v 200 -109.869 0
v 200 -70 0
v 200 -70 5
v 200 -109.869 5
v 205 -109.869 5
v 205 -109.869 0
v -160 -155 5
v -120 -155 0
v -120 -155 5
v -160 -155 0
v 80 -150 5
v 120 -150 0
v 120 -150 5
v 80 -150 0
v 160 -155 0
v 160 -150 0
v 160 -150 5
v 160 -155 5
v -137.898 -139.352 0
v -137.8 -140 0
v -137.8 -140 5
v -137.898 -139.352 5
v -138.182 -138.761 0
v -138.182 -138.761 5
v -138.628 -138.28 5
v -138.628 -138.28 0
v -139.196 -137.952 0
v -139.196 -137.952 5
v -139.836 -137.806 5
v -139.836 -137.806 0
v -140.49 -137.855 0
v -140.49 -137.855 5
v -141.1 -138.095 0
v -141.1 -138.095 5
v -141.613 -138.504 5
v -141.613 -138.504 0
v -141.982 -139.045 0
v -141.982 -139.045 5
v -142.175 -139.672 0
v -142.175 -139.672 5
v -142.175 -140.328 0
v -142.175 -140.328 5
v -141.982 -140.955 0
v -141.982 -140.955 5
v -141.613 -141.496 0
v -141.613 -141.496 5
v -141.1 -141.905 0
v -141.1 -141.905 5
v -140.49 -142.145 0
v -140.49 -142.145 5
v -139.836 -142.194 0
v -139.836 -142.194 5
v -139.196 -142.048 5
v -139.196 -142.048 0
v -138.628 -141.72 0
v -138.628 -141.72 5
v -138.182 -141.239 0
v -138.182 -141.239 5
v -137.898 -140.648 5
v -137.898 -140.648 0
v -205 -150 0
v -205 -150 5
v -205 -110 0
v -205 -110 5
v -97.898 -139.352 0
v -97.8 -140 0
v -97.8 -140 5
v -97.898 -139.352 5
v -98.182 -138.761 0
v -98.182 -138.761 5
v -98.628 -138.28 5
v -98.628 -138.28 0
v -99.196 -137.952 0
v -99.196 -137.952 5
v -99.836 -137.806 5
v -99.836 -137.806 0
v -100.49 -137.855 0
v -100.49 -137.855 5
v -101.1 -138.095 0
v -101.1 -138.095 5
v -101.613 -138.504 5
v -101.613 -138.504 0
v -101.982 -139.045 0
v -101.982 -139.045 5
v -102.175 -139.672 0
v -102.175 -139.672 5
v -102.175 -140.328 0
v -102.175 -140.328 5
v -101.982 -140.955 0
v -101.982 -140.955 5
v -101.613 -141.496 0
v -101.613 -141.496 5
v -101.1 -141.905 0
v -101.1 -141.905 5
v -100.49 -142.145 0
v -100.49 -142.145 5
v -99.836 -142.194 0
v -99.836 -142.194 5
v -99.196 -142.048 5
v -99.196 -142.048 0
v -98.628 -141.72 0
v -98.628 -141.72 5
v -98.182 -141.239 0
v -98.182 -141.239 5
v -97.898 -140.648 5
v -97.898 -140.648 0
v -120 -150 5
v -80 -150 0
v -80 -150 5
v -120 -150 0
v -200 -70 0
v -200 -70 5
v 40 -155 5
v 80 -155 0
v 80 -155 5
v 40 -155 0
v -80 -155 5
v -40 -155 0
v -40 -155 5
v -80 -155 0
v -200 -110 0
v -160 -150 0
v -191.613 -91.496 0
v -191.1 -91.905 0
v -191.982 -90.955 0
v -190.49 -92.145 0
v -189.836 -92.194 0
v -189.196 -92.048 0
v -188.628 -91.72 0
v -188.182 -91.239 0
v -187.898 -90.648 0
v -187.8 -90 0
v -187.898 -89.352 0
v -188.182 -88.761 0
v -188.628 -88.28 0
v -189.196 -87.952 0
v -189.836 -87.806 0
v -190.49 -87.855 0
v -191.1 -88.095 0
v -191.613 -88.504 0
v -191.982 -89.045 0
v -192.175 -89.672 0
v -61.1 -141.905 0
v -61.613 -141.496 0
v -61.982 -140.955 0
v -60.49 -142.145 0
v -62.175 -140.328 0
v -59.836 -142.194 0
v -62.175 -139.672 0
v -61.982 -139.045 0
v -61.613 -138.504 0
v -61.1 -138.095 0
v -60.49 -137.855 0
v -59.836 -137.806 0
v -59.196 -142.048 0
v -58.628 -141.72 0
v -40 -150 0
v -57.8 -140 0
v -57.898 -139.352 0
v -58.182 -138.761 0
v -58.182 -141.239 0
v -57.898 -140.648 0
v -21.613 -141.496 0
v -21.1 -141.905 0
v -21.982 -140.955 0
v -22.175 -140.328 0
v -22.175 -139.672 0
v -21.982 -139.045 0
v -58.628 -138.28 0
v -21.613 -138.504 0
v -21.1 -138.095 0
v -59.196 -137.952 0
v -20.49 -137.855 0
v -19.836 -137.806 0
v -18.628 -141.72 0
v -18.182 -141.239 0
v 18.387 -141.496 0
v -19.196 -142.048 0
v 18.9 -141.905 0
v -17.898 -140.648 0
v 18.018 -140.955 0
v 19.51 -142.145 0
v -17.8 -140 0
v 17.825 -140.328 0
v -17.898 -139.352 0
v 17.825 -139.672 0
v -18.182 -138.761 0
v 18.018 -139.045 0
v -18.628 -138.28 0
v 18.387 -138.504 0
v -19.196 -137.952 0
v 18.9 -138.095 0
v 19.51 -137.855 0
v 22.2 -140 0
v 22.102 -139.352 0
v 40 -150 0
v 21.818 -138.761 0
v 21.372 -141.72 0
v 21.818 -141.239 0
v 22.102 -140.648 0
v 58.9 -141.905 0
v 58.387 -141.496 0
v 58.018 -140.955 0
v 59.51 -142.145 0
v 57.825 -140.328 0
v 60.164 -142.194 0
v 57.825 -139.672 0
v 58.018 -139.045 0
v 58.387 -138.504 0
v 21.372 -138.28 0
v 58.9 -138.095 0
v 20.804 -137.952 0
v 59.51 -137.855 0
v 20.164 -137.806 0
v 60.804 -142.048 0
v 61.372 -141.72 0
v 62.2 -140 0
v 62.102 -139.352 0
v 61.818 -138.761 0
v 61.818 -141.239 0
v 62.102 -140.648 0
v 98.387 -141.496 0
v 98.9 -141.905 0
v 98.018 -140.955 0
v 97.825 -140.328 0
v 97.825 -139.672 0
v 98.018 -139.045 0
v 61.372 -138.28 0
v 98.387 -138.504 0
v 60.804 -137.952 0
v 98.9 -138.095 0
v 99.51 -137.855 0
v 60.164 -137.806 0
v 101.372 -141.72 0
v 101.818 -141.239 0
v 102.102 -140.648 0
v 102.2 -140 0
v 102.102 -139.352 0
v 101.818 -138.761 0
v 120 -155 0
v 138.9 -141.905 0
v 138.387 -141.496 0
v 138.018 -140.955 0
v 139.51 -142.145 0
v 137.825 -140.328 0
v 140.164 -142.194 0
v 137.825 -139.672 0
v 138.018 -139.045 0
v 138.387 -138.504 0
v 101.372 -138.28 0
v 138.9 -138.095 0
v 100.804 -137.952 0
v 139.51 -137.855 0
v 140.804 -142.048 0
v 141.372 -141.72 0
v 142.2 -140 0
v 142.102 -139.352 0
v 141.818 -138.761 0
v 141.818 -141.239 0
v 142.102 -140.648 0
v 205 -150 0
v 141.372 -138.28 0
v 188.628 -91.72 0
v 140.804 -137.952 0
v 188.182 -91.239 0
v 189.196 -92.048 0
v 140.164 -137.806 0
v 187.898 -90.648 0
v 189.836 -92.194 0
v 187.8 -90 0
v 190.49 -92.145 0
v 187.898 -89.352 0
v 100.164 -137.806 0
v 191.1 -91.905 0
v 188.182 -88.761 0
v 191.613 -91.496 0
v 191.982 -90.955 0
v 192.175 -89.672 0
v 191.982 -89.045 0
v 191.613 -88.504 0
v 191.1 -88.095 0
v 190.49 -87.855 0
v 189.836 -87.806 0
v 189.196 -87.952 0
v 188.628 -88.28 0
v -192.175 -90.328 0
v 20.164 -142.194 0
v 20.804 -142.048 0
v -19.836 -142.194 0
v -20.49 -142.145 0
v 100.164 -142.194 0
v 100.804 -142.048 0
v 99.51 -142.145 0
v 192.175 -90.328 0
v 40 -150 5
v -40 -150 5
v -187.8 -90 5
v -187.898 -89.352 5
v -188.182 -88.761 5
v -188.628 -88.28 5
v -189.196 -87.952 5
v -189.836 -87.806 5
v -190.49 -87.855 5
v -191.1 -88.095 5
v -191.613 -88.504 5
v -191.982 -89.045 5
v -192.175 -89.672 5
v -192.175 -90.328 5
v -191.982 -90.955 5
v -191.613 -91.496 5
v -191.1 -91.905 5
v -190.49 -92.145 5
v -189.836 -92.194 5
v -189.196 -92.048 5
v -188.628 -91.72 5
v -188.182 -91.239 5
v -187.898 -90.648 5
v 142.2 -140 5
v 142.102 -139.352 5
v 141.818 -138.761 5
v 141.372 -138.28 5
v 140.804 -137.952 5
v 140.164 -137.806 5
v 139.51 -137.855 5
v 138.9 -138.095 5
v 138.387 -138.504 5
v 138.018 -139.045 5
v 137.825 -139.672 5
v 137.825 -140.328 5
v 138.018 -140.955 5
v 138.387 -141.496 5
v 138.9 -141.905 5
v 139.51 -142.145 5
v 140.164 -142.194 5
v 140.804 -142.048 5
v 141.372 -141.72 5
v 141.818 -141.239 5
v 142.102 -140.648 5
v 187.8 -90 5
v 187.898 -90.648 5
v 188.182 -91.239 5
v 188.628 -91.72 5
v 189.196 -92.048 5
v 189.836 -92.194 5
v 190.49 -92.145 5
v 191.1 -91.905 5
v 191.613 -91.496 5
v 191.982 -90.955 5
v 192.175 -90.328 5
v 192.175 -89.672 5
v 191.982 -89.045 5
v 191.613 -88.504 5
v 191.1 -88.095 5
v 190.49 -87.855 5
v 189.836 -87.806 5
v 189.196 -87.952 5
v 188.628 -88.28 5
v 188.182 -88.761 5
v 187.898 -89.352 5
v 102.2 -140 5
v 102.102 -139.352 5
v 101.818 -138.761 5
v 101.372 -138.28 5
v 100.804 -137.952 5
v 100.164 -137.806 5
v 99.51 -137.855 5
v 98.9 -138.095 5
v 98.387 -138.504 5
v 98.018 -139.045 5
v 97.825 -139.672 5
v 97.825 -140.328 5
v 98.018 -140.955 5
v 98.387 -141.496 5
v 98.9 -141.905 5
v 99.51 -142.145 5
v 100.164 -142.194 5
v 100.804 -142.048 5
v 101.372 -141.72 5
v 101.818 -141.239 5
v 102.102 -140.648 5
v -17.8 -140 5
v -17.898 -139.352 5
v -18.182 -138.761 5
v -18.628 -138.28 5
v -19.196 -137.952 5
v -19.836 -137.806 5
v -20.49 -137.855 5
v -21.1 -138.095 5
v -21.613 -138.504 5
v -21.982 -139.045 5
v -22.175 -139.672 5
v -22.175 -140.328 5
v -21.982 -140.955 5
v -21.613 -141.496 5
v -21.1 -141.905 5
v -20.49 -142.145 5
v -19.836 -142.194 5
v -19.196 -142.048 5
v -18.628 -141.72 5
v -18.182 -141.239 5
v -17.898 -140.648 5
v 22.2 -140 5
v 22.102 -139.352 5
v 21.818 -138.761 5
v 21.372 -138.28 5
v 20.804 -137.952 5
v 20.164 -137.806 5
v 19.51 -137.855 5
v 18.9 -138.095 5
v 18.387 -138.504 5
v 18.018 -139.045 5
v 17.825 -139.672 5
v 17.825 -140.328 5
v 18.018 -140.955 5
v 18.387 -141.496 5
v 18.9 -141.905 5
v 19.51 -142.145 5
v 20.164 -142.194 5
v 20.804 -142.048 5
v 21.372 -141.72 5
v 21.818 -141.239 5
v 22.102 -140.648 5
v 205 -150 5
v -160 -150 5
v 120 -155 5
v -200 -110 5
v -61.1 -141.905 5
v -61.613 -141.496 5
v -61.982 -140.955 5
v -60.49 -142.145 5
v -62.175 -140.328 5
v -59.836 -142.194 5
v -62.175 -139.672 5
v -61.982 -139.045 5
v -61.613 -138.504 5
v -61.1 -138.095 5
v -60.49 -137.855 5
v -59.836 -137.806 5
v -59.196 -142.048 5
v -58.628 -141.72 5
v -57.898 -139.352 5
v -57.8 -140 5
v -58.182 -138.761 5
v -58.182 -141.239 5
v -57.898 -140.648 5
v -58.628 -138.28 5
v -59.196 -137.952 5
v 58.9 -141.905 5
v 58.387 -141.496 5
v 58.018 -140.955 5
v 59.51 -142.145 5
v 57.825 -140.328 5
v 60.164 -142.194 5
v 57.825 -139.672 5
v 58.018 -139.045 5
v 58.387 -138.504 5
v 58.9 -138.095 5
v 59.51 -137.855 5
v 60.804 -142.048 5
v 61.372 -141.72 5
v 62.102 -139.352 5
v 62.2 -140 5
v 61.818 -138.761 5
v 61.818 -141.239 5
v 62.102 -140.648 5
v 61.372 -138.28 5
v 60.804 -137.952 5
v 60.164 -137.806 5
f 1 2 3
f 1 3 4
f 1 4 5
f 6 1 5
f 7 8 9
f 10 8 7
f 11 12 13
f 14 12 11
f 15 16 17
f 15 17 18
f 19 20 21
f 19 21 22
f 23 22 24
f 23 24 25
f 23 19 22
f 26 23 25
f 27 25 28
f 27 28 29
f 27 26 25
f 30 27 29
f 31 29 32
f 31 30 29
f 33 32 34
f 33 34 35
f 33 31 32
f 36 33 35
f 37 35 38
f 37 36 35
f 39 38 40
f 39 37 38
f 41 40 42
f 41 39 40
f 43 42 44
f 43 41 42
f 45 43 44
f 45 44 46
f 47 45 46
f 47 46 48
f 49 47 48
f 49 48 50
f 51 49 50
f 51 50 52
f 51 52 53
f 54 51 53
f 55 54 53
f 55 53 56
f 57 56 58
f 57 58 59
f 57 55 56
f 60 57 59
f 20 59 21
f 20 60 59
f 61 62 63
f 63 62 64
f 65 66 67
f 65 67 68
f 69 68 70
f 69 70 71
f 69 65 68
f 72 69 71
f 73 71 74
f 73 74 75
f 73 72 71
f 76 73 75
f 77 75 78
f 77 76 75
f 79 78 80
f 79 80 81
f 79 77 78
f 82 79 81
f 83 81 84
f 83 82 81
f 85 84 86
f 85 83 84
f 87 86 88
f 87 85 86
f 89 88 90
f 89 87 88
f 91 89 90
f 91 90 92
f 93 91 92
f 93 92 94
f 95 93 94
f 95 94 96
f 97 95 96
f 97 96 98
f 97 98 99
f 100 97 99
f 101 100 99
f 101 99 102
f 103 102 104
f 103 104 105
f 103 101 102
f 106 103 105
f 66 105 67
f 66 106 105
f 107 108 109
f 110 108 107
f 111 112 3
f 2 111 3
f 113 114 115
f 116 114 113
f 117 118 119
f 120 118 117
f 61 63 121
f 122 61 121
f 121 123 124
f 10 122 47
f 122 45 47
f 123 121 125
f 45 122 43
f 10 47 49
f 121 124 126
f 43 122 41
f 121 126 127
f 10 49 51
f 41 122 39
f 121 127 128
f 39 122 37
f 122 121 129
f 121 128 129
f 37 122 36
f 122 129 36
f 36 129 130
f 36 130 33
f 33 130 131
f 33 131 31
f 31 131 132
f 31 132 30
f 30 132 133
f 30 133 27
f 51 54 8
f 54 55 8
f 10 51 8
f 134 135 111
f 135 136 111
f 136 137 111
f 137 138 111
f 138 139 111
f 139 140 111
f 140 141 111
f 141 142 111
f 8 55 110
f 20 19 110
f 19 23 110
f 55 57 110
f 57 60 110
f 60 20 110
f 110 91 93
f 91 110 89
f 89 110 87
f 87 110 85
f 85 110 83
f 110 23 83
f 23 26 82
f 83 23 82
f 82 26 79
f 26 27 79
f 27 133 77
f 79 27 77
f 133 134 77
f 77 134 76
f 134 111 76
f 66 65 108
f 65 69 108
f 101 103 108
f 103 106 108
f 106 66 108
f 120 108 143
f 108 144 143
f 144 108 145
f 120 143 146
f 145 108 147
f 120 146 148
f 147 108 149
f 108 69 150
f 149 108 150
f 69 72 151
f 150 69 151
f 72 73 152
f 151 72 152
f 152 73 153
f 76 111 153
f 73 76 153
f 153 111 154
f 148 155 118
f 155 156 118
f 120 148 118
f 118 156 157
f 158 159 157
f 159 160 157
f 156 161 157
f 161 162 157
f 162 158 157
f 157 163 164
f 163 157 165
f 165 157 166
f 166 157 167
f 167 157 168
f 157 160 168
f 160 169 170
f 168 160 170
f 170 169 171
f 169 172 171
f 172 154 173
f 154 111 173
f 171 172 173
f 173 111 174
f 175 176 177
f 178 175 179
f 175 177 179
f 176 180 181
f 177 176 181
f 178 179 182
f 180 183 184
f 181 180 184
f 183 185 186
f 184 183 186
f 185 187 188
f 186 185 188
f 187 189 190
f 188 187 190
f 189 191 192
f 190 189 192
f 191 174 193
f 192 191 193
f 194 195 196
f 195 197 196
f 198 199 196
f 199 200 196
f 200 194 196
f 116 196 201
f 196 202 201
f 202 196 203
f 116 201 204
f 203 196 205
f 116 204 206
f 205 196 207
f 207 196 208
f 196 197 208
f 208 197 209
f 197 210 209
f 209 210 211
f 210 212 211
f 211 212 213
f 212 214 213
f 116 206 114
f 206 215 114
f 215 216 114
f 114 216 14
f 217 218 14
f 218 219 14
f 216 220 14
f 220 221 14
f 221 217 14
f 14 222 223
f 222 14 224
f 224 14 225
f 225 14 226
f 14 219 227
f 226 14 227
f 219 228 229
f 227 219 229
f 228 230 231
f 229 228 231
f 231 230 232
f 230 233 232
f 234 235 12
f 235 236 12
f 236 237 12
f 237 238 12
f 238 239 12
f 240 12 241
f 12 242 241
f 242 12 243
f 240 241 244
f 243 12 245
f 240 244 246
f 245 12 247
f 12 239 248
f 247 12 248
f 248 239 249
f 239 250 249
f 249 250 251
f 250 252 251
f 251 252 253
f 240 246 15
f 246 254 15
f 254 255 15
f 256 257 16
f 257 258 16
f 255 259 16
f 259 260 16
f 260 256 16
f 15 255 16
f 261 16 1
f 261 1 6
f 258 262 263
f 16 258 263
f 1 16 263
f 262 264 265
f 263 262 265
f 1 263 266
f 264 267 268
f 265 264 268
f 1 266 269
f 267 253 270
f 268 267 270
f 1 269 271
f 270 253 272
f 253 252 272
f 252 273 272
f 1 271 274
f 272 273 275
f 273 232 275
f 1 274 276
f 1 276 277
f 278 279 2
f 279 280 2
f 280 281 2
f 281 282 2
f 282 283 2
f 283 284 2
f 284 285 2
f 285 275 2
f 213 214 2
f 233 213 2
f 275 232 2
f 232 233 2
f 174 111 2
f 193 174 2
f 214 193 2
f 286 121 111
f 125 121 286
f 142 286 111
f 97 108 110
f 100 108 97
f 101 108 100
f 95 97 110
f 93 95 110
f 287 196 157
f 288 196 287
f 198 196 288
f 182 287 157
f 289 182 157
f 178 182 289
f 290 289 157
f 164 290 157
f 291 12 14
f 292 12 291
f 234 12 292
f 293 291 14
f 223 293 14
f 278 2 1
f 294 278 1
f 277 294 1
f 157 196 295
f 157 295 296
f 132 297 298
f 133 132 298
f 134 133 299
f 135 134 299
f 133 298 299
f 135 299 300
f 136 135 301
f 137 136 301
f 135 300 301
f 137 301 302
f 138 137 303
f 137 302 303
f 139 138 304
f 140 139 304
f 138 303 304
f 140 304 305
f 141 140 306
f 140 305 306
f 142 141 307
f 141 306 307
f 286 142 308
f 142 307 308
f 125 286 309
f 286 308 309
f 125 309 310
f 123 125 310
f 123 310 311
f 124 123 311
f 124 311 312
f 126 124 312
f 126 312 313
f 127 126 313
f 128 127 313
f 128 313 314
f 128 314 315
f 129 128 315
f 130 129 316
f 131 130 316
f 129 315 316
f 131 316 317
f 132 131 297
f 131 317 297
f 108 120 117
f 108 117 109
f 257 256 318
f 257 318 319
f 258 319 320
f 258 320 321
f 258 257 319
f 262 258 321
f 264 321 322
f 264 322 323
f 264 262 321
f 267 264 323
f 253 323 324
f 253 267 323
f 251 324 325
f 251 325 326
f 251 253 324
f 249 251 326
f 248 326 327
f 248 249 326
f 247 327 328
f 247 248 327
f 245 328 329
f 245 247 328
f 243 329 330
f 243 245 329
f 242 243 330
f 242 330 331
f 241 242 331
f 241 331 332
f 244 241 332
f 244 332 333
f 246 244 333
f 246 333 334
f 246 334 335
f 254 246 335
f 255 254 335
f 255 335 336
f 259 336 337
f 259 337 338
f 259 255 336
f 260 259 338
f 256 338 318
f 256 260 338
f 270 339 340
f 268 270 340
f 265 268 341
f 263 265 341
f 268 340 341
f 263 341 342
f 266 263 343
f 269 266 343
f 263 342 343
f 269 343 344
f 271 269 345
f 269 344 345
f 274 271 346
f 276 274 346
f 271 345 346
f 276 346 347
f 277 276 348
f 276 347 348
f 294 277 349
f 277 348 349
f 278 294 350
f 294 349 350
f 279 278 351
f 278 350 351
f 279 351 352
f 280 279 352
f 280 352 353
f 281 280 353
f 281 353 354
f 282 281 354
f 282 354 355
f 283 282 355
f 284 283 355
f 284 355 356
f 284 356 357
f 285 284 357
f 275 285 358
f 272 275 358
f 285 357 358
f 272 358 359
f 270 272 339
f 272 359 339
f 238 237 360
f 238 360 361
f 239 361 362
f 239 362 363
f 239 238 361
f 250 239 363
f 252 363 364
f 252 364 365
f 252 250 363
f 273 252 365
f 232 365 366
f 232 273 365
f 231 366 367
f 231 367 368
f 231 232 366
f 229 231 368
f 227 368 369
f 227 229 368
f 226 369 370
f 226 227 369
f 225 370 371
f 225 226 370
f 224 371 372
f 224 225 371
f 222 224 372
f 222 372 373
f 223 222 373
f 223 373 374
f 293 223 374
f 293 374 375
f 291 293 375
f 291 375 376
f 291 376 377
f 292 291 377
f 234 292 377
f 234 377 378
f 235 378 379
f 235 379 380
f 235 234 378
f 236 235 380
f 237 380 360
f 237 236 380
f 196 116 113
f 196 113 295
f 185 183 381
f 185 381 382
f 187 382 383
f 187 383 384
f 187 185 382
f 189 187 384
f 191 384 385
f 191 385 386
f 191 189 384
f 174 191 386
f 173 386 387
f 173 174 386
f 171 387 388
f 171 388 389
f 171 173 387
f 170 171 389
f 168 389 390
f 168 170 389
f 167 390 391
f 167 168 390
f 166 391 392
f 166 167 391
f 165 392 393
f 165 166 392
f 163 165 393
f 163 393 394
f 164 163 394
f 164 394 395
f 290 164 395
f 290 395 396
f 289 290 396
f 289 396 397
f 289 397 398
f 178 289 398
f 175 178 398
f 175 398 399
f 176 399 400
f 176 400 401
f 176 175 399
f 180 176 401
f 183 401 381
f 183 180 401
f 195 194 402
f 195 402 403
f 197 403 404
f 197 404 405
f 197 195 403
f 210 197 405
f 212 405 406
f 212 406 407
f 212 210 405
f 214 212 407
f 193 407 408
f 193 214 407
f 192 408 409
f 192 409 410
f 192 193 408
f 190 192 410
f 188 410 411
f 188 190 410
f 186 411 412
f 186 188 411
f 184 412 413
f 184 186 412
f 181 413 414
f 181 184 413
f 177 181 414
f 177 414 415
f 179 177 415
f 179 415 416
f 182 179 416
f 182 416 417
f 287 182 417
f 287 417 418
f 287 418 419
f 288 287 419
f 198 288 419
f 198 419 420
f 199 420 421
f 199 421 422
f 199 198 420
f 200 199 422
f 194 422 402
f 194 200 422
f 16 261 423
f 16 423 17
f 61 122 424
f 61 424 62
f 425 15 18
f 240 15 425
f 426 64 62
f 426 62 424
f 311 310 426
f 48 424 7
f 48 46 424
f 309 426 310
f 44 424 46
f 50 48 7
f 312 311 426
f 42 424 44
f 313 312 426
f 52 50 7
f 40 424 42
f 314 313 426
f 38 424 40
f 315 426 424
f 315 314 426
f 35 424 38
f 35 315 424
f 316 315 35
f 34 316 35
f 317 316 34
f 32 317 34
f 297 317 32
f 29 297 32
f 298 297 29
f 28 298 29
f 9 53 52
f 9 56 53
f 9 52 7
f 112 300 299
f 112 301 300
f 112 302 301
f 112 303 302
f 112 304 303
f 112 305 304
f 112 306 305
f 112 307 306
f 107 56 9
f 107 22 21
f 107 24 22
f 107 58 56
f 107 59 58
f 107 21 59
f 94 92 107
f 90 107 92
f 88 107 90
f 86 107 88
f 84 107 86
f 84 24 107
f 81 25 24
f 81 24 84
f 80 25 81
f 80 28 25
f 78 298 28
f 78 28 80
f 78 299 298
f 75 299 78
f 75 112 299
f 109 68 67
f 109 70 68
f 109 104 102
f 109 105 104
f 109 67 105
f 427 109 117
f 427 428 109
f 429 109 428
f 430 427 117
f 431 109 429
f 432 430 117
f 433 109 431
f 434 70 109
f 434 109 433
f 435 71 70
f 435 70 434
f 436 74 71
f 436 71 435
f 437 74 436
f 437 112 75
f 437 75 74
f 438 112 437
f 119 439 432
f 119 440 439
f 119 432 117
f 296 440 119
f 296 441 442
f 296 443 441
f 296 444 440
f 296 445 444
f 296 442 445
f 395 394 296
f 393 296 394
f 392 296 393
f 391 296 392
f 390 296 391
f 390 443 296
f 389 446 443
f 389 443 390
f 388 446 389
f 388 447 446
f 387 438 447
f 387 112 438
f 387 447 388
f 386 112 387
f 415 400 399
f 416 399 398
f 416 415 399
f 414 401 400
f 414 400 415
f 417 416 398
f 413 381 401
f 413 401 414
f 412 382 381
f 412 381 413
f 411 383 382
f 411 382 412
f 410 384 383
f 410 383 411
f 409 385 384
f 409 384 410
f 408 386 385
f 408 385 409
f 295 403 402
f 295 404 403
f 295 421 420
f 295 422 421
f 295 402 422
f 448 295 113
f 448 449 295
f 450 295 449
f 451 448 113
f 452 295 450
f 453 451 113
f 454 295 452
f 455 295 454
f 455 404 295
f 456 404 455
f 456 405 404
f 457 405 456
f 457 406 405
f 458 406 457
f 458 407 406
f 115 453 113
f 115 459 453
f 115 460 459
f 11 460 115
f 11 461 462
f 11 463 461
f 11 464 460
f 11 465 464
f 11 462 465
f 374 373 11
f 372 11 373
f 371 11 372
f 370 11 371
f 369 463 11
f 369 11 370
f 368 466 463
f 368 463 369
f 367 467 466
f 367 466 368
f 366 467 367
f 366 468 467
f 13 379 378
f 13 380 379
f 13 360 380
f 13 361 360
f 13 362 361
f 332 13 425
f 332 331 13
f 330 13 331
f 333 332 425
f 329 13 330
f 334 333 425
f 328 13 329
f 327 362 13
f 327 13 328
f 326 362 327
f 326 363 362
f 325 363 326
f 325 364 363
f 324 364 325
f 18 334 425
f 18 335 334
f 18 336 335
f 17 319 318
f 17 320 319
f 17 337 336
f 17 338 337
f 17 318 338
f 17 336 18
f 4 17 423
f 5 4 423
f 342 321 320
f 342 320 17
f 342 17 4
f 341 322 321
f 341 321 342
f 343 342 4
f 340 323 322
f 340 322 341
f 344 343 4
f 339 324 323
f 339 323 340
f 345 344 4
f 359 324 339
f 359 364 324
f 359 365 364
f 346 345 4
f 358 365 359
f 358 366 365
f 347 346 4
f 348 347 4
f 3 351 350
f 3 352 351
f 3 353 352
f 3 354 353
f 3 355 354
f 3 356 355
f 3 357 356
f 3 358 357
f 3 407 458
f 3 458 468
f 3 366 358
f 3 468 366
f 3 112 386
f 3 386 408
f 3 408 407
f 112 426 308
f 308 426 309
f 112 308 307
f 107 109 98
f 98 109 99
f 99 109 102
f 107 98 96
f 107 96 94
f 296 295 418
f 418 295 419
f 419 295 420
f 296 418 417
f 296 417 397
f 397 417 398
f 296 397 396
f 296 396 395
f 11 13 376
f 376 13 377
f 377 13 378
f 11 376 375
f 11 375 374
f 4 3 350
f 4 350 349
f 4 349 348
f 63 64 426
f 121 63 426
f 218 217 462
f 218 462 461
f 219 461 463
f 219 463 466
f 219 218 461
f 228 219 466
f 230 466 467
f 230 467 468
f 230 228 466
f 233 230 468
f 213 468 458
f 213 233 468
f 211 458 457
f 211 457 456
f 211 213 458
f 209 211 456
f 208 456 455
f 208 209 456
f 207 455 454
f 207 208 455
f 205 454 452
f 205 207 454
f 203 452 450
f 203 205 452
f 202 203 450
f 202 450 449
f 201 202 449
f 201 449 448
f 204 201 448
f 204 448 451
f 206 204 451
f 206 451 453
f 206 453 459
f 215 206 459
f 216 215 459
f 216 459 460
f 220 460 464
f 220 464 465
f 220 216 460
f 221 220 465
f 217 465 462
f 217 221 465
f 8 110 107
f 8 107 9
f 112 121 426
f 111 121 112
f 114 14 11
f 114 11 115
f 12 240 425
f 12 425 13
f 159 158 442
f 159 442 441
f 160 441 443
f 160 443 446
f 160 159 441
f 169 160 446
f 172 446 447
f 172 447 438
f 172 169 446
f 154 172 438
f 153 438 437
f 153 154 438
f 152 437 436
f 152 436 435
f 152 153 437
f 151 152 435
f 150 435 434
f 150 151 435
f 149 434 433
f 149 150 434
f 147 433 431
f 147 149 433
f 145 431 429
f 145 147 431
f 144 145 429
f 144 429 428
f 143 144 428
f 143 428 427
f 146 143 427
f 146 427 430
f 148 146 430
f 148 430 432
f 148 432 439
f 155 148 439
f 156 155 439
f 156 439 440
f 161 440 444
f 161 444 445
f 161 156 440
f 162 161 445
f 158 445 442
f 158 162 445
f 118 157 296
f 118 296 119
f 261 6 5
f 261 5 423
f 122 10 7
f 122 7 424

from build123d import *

# Parameters (mm, degrees)
SKETCH_1_R          = 2.2
EXTRUDE_1_DEPTH     = 5
SKETCH_2_W          = 5
SKETCH_2_H          = 220.282443136
SKETCH_2_H_2        = 219.868690955
CUT_EXTRUDE_1_DEPTH = 10
SKETCH_3_W          = 5
SKETCH_3_H          = 40
EXTRUDE_3_DEPTH     = 5
SKETCH_4_W          = 390.4211829
SKETCH_4_H          = 264.690207343
EXTRUDE_4_DEPTH     = 5
SKETCH_5_R          = 2.2
CUT_EXTRUDE_2_DEPTH = 5
SKETCH_6_W          = 410
SKETCH_6_H          = 266.694039068
CUT_EXTRUDE_4_DEPTH = 10


with BuildPart() as part:
    # 草图1 → 凸台-拉伸1 (new body)
    with BuildSketch(Plane.XY):
        Polygon((-200, 150), (200, 150), (200, 110), (205, 110), (205, 70), (200, 70), (200, 30), (205, 30), (205, -30), (200, -30), (200, -70), (205, -70), (205, -110), (200, -110), (200, -150), (160, -150), (160, -155), (120, -155), (120, -150), (80, -150), (80, -155), (40, -155), (40, -150), (-40, -150), (-40, -155), (-80, -155), (-80, -150), (-120, -150), (-120, -155), (-160, -155), (-160, -150), (-200, -150), (-200, -110), (-205, -110), (-205, -70), (-200, -70), (-200, -30), (-205, -30), (-205, 30), (-200, 30), (-200, 70), (-205, 70), (-205, 110), (-200, 110), align=None)
        with Locations((-140, -140)):
            Circle(SKETCH_1_R, mode=Mode.SUBTRACT)
        with Locations((-100, -140)):
            Circle(SKETCH_1_R, mode=Mode.SUBTRACT)
        with Locations((-60, -140)):
            Circle(SKETCH_1_R, mode=Mode.SUBTRACT)
        with Locations((-20, -140)):
            Circle(SKETCH_1_R, mode=Mode.SUBTRACT)
        with Locations((20, -140)):
            Circle(SKETCH_1_R, mode=Mode.SUBTRACT)
        with Locations((60, -140)):
            Circle(SKETCH_1_R, mode=Mode.SUBTRACT)
        with Locations((100, -140)):
            Circle(SKETCH_1_R, mode=Mode.SUBTRACT)
        with Locations((140, -140)):
            Circle(SKETCH_1_R, mode=Mode.SUBTRACT)
        with Locations((-190, 110)):
            Circle(SKETCH_1_R, mode=Mode.SUBTRACT)
        with Locations((-190, 70)):
            Circle(SKETCH_1_R, mode=Mode.SUBTRACT)
        with Locations((-190, 30)):
            Circle(SKETCH_1_R, mode=Mode.SUBTRACT)
        with Locations((-190, -30)):
            Circle(SKETCH_1_R, mode=Mode.SUBTRACT)
        with Locations((-190, -70)):
            Circle(SKETCH_1_R, mode=Mode.SUBTRACT)
        with Locations((-190, -110)):
            Circle(SKETCH_1_R, mode=Mode.SUBTRACT)
        with Locations((190, -110)):
            Circle(SKETCH_1_R, mode=Mode.SUBTRACT)
        with Locations((190, -70)):
            Circle(SKETCH_1_R, mode=Mode.SUBTRACT)
        with Locations((190, -30)):
            Circle(SKETCH_1_R, mode=Mode.SUBTRACT)
        with Locations((190, 30)):
            Circle(SKETCH_1_R, mode=Mode.SUBTRACT)
        with Locations((190, 70)):
            Circle(SKETCH_1_R, mode=Mode.SUBTRACT)
        with Locations((190, 110)):
            Circle(SKETCH_1_R, mode=Mode.SUBTRACT)
    extrude(amount=EXTRUDE_1_DEPTH)

    # 草图2 → 切除-拉伸1 (cut)
    with BuildSketch(Plane.XY.offset(5)):
        with Locations((-202.5, -0.141221568)):
            Rectangle(SKETCH_2_W, SKETCH_2_H)
        with Locations((202.5, 0.065654522)):
            Rectangle(SKETCH_2_W, SKETCH_2_H_2)
    extrude(amount=-CUT_EXTRUDE_1_DEPTH, mode=Mode.SUBTRACT)

    # 草图3 → 凸台-拉伸3 (add)
    with BuildSketch(Plane.XY.offset(5)):
        with Locations((-202.5, 130)):
            Rectangle(SKETCH_3_W, SKETCH_3_H)
        with Locations((-202.5, 50)):
            Rectangle(SKETCH_3_W, SKETCH_3_H)
        with Locations((-202.5, -50)):
            Rectangle(SKETCH_3_W, SKETCH_3_H)
        with Locations((-202.5, -130)):
            Rectangle(SKETCH_3_W, SKETCH_3_H)
        with Locations((202.5, -130)):
            Rectangle(SKETCH_3_W, SKETCH_3_H)
        with Locations((202.5, -50)):
            Rectangle(SKETCH_3_W, SKETCH_3_H)
        with Locations((202.5, 50)):
            Rectangle(SKETCH_3_W, SKETCH_3_H)
        with Locations((202.5, 130)):
            Rectangle(SKETCH_3_W, SKETCH_3_H)
    extrude(amount=-EXTRUDE_3_DEPTH)

    # 草图4 → 凸台-拉伸4 (add)
    with BuildSketch(Plane.XY.offset(5)):
        with Locations((1.806920954, 7.46039962)):
            Rectangle(SKETCH_4_W, SKETCH_4_H)
    extrude(amount=-EXTRUDE_4_DEPTH)

    # 草图5 → 切除-拉伸2 (cut)
    with BuildSketch(Plane.XY.offset(5)):
        with Locations((-190, 90)):
            Circle(SKETCH_5_R)
        with Locations((-190, 50)):
            Circle(SKETCH_5_R)
        with Locations((-190, 0)):
            Circle(SKETCH_5_R)
        with Locations((-190, -50)):
            Circle(SKETCH_5_R)
        with Locations((-190, -90)):
            Circle(SKETCH_5_R)
        with Locations(Location((190, -90, 0), (0, 0, 180))):
            Circle(SKETCH_5_R)
        with Locations(Location((190, -50, 0), (0, 0, 180))):
            Circle(SKETCH_5_R)
        with Locations(Location((190, 0, 0), (0, 0, 180))):
            Circle(SKETCH_5_R)
        with Locations(Location((190, 50, 0), (0, 0, 180))):
            Circle(SKETCH_5_R)
        with Locations(Location((190, 90, 0), (0, 0, 180))):
            Circle(SKETCH_5_R)
    extrude(amount=-CUT_EXTRUDE_2_DEPTH, mode=Mode.SUBTRACT)

    # 草图6 → 切除-拉伸4 (cut)
    with BuildSketch(Plane.XY.offset(5)):
        with Locations((0, 63.347019534)):
            Rectangle(SKETCH_6_W, SKETCH_6_H)
    extrude(amount=-CUT_EXTRUDE_4_DEPTH, mode=Mode.SUBTRACT)


solid = part.part
